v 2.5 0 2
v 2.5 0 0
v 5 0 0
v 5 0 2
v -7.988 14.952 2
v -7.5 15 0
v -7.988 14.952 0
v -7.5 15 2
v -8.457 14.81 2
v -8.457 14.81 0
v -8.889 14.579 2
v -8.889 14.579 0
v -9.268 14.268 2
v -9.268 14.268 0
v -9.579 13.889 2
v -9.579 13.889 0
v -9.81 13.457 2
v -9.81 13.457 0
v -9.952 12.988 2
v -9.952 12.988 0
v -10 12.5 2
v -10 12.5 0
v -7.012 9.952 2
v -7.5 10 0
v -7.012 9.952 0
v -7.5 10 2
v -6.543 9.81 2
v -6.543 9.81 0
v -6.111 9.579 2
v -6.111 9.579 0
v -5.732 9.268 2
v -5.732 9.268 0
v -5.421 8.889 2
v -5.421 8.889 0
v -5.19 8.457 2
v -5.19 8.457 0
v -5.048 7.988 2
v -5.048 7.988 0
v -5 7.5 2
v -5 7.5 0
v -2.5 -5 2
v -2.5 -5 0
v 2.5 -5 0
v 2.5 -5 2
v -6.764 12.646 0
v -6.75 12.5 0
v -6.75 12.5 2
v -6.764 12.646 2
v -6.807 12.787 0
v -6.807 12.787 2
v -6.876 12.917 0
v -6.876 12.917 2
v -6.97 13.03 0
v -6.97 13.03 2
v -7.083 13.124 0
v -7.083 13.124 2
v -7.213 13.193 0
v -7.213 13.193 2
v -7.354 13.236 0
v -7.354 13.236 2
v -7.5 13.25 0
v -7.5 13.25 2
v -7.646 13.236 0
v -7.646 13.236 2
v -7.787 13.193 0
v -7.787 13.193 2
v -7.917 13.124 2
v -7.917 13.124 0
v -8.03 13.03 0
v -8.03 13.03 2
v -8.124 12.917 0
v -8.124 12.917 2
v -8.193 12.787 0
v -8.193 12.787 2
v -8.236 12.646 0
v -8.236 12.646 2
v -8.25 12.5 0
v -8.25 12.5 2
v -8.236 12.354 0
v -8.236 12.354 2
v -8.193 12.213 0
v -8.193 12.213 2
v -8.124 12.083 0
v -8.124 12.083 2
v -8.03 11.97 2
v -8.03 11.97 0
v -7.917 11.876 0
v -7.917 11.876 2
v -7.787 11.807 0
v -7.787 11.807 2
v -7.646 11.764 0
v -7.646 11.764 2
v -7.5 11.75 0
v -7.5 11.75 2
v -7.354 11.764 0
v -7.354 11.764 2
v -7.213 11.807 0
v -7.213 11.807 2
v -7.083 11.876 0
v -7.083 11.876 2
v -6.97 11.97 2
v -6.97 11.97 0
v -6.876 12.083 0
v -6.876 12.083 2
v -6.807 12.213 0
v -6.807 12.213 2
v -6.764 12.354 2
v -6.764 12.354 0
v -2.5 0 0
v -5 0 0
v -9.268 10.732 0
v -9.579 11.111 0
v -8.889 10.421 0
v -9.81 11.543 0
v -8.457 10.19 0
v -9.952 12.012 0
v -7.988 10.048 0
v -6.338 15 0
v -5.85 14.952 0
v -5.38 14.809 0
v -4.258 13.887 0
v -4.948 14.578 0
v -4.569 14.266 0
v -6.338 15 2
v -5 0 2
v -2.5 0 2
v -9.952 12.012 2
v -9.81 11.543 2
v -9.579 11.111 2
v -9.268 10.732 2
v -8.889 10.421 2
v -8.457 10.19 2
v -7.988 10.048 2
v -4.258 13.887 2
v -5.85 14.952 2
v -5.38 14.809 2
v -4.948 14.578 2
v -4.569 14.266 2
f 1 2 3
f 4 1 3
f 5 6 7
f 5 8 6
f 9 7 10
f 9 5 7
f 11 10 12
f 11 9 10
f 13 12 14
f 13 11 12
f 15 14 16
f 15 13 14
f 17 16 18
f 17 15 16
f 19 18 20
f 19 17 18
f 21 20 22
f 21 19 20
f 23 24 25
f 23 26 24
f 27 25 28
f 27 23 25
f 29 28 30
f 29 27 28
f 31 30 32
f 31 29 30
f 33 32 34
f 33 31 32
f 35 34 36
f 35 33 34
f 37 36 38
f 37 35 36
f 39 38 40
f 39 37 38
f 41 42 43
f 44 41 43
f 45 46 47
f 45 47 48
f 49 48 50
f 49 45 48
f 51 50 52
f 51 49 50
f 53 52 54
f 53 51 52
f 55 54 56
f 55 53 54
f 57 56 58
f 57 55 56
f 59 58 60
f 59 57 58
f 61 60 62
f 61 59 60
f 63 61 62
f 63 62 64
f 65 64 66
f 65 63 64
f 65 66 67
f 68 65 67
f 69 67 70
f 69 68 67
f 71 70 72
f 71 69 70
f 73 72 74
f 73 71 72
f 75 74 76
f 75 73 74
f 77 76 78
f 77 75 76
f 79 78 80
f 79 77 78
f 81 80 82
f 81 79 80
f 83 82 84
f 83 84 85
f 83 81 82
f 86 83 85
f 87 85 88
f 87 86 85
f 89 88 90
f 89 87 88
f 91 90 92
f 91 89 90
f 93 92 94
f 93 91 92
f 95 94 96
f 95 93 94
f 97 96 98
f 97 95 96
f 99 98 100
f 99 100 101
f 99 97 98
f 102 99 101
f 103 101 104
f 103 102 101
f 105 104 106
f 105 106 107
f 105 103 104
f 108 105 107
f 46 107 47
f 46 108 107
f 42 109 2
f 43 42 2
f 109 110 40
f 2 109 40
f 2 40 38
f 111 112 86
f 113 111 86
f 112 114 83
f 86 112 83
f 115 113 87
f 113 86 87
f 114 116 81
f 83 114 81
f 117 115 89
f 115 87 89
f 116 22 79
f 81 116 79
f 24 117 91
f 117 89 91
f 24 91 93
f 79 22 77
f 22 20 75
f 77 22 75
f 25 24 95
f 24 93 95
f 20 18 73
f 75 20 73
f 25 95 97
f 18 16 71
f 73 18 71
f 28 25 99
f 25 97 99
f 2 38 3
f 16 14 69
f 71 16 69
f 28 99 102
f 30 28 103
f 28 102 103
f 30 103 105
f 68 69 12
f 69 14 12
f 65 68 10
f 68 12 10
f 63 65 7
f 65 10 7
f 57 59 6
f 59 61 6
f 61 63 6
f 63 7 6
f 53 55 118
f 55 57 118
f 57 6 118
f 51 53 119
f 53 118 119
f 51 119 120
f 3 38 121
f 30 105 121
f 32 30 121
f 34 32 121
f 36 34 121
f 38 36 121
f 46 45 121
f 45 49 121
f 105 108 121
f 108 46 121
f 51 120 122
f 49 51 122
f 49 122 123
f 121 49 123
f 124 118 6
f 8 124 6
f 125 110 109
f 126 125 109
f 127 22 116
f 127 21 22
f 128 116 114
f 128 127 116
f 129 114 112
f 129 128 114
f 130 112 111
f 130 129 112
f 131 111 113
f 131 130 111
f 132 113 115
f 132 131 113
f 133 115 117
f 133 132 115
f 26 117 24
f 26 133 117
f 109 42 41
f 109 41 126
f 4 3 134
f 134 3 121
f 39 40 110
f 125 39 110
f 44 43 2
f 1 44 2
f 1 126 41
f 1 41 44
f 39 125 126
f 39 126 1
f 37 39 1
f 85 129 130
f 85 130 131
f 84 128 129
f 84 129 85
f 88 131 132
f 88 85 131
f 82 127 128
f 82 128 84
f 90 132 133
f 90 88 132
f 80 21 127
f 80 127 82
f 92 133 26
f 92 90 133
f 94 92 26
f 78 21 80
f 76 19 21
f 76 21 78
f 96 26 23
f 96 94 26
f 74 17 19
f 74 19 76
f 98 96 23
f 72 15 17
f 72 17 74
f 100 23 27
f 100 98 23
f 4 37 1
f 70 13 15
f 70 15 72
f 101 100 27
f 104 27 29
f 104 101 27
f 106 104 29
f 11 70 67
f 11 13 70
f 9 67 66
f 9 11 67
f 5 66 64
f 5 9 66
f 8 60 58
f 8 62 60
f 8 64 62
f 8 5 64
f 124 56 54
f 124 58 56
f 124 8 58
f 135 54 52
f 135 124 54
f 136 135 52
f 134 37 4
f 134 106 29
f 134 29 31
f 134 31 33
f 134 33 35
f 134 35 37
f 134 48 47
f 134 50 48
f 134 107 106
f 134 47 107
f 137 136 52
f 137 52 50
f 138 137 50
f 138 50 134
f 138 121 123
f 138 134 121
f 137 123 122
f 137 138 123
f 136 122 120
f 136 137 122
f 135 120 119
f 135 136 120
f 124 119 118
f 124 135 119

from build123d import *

# Parameters (mm, degrees)
F0_R     = 0.75
F0_W     = 5
F0_H     = 5
F1_DEPTH = 2
F2_R     = 2.49999


# Not quite as in the source:
# - a fillet or chamfer is up to 0.001 mm smaller than in the source, because OpenCascade refuses the exact size


with BuildPart() as f1:
    # F0 (on Top) → F1 (new body)
    with BuildSketch(Plane.XY):
        Polygon((-5, 0), (-2.5, 0), (2.5, 0), (5, 0), (-5, 15), (-10, 15), (-10, 10), (-5, 10), align=None)
        with Locations((-7.5, 12.5)):
            Circle(F0_R, mode=Mode.SUBTRACT)
        with Locations((0, -2.5)):
            Rectangle(F0_W, F0_H)
    extrude(amount=F1_DEPTH)

    # F2 (radius 2.5 in the source; OpenCascade refuses exactly that, so slightly less here)
    f2_edges = [f1.edges().sort_by_distance(p)[0] for p in [
        (-10, 15, 1),
        (-10, 10, 1),
        (-5, 15, 1),
        (-5, 10, 1),
    ]]
    fillet(f2_edges, radius=F2_R)


solid = f1.part
